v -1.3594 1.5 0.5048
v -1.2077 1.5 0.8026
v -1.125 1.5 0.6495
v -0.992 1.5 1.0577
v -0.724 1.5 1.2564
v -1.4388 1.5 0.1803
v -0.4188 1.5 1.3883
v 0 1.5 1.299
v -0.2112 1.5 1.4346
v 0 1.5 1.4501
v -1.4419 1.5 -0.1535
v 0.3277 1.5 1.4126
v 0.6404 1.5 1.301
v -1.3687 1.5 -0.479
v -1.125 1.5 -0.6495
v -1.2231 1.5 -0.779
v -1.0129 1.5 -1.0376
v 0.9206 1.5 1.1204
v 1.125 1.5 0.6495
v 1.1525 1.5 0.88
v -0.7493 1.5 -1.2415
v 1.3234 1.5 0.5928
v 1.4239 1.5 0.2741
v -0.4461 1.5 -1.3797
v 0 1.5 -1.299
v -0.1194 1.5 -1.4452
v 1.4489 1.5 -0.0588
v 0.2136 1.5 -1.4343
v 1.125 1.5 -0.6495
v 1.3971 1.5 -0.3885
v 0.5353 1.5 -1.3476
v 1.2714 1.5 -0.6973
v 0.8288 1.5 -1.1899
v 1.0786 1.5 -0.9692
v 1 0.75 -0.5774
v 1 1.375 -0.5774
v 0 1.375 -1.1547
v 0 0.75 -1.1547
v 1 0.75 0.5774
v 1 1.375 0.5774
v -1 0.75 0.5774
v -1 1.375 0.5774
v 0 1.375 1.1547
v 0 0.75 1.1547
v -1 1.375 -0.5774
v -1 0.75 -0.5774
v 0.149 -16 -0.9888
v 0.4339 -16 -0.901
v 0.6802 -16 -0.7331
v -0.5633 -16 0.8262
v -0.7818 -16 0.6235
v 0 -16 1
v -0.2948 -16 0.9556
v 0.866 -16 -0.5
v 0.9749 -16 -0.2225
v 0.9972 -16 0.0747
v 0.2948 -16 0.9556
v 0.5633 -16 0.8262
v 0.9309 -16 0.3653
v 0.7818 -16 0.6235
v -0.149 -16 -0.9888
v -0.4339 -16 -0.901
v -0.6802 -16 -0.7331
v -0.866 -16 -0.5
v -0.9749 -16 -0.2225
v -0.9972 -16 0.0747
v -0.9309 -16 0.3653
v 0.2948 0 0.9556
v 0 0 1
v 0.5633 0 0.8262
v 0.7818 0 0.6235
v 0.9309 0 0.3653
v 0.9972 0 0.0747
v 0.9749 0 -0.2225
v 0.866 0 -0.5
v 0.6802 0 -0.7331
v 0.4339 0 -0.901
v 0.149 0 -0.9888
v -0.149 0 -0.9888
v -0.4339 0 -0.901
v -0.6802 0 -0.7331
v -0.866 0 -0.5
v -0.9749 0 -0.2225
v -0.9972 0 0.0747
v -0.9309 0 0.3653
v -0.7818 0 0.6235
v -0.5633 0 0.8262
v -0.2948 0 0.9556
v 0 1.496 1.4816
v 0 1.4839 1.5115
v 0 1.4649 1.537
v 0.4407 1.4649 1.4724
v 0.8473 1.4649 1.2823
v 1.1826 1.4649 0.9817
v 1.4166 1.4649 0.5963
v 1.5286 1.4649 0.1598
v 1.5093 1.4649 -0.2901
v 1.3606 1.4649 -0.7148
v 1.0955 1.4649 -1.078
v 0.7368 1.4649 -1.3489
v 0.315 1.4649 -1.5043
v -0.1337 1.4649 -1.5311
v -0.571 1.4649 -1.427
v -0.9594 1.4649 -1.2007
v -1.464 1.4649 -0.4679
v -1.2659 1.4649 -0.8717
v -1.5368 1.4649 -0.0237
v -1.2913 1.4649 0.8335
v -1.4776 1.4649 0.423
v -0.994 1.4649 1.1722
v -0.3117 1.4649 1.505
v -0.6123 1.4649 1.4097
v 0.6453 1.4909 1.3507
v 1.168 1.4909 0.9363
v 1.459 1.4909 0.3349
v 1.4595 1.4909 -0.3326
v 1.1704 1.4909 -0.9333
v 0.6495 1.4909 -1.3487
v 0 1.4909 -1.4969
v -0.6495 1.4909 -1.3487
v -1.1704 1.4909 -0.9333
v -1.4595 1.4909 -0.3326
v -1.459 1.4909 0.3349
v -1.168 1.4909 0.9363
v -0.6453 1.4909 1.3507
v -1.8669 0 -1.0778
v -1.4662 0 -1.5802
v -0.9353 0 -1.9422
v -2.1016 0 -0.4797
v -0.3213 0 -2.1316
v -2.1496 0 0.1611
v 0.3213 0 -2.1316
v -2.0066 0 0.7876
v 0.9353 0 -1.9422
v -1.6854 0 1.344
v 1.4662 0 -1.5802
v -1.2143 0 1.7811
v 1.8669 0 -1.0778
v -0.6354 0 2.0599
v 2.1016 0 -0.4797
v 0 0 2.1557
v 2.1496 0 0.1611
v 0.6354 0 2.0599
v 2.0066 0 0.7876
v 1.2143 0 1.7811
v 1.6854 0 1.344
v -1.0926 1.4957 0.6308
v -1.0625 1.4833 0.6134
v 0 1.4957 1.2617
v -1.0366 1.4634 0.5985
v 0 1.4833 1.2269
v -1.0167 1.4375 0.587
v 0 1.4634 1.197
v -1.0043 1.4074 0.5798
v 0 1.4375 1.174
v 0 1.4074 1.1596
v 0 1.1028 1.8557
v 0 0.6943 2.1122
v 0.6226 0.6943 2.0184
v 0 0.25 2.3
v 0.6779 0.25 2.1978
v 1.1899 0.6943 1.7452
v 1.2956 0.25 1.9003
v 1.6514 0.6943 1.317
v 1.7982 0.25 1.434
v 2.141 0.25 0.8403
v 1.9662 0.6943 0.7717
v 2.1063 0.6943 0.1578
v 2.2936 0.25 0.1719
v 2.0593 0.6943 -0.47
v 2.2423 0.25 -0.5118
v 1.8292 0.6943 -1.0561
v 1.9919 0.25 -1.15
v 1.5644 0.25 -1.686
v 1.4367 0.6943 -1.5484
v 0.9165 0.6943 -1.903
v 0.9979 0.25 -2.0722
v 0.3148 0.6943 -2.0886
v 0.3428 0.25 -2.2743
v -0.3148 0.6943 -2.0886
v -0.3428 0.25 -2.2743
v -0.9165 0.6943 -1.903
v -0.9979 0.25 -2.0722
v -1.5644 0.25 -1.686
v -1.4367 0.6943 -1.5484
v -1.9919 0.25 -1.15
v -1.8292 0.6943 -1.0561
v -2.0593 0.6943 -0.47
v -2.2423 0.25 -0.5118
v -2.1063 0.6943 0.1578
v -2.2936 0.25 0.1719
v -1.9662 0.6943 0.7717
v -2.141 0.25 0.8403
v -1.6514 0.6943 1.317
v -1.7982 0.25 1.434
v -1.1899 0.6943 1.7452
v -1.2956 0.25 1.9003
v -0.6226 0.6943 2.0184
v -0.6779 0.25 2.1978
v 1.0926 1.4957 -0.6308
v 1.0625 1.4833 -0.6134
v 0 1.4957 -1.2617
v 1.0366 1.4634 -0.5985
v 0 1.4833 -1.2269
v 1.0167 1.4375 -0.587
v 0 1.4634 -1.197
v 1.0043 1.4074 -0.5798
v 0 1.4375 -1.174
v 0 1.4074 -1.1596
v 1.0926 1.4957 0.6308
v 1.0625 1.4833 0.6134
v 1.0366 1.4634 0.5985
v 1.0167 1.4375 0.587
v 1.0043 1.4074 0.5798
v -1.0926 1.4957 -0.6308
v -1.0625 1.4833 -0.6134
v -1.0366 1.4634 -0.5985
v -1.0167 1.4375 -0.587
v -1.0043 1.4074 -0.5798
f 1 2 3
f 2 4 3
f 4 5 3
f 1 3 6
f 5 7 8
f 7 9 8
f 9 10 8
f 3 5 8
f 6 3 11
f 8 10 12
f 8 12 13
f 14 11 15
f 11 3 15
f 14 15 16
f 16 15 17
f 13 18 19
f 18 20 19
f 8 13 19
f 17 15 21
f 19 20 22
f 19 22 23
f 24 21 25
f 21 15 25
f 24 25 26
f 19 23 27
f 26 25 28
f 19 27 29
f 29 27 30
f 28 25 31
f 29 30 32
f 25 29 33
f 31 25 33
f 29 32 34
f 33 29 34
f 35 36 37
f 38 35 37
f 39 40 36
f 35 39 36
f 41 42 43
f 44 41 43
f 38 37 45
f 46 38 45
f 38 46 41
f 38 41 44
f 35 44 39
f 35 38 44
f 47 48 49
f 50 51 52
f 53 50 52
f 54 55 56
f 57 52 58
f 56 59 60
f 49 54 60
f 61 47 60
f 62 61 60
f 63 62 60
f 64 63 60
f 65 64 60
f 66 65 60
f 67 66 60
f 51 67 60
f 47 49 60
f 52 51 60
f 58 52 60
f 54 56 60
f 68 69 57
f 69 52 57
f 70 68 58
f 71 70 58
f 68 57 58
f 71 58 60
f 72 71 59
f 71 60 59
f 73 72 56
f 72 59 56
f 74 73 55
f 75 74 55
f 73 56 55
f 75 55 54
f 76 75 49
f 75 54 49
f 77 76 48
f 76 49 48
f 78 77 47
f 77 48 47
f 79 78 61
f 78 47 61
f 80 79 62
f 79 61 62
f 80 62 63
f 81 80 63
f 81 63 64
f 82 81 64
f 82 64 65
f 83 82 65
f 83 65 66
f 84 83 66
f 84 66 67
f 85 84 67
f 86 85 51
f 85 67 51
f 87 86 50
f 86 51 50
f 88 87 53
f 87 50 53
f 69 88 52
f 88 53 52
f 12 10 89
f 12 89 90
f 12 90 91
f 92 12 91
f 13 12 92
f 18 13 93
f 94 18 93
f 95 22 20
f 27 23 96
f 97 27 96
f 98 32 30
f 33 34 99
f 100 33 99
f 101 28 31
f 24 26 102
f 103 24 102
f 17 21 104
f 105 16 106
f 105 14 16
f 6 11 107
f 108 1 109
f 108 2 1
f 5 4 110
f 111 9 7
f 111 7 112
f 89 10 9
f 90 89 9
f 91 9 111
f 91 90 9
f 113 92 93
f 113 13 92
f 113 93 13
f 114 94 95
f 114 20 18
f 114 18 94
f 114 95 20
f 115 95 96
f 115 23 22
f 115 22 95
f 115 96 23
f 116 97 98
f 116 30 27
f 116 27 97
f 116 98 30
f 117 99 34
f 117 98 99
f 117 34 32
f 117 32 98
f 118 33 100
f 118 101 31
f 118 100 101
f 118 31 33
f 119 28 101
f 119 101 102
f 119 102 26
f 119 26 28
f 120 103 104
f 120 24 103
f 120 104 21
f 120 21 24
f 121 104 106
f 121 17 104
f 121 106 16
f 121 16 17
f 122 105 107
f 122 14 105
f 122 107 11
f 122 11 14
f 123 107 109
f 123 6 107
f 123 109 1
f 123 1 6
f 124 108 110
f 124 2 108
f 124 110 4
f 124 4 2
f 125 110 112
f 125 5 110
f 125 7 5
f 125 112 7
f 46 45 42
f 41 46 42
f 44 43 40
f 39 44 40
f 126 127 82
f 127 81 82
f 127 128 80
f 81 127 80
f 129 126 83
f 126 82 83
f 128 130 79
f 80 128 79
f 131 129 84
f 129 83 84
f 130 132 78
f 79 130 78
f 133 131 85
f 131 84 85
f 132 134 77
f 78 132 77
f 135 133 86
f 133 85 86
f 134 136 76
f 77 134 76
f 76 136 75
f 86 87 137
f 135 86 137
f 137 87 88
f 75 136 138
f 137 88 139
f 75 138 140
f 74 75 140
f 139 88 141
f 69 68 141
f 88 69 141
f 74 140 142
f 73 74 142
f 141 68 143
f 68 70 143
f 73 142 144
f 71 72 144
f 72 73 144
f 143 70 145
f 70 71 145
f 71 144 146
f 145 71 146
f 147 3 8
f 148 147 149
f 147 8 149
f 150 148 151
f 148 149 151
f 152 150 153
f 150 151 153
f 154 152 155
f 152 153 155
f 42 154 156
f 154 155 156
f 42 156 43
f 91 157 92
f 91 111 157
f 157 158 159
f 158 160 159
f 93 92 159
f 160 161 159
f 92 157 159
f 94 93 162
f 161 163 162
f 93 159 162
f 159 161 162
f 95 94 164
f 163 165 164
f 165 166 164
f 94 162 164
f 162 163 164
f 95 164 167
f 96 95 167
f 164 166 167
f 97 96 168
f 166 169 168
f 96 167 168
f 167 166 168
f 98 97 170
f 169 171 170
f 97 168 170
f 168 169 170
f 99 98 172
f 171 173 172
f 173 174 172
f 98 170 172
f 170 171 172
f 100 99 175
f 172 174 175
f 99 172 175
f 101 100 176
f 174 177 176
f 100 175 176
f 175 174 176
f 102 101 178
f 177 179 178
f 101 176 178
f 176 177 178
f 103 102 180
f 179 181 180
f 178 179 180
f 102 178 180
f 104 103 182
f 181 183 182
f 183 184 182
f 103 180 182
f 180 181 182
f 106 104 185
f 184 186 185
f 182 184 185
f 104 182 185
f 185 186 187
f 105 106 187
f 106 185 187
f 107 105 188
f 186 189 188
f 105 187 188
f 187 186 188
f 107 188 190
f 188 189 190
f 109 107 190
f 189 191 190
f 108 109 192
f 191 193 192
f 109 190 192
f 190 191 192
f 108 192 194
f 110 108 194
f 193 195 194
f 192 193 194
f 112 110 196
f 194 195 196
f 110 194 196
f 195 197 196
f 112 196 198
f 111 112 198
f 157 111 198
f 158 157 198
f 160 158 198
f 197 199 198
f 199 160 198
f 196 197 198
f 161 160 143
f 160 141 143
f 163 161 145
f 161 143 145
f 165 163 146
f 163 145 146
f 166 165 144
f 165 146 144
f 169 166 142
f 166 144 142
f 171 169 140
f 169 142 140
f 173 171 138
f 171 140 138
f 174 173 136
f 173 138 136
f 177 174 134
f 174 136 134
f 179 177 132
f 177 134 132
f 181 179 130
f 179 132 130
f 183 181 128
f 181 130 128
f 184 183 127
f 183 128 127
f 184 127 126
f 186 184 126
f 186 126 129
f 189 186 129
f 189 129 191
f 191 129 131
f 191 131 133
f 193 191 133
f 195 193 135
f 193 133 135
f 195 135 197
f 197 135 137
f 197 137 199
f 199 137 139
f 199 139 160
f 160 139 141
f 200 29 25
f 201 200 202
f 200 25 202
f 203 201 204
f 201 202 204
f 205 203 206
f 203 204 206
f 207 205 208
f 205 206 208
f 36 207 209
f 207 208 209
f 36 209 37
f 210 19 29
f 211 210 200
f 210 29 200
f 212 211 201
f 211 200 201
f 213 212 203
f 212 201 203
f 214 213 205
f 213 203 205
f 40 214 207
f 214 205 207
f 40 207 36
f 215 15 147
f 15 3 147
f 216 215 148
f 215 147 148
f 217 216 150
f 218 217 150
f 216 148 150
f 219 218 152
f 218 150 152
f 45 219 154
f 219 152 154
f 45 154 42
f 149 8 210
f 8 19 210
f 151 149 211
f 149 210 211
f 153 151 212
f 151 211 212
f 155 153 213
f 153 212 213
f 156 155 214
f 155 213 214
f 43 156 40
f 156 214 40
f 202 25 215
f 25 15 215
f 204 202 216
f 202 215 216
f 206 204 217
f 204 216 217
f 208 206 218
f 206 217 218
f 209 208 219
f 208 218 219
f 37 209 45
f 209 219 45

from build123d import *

# Parameters (mm, degrees)
CUT_EXTRUDE1_DEPTH = 0.75
FILLET1_R          = 0.125


with BuildPart() as part:
    # Sketch1 → Revolve1 (revolve)
    with BuildSketch(Plane(origin=(0, 0, 0), x_dir=(0, 0, -1), z_dir=(1, 0, 0))):
        with BuildLine():
            Line((0, 1.5), (-1.5, 1.5))
            ThreePointArc((-1.5, 1.5), (-1.978515811, 0.925250119), (-2.3, 0.25))
            Line((-2.3, 0.25), (-2.155662433, 0))
            Line((-2.155662433, 0), (-1, 0))
            Line((-1, 0), (-1, -16))
            Line((-1, -16), (0, -16))
            Line((0, -16), (0, 1.5))
        make_face()
    revolve(axis=Axis((0, -16, 0), (0, 1, 0)))

    # Sketch2 → Cut-Extrude1 (cut)
    with BuildSketch(Plane(origin=(0, 1.5, 0), x_dir=(1, 0, 0), z_dir=(0, 1, 0))):
        Polygon((0, 1.154700538), (-1, 0.577350269), (-1, -0.577350269), (0, -1.154700538), (1, -0.577350269), (1, 0.577350269), align=None)
    extrude(amount=-CUT_EXTRUDE1_DEPTH, mode=Mode.SUBTRACT)

    # Fillet1
    fillet1_edges = [part.edges().sort_by_distance(p)[0] for p in [
        (0.5, 1.5, -0.866025404),
        (-0.5, 1.5, -0.866025404),
        (-1, 1.5, 0),
        (-0.5, 1.5, 0.866025404),
        (0.5, 1.5, 0.866025404),
        (1, 1.5, 0),
        (0, 1.5, -1.5),
    ]]
    fillet(fillet1_edges, radius=FILLET1_R)


solid = part.part
